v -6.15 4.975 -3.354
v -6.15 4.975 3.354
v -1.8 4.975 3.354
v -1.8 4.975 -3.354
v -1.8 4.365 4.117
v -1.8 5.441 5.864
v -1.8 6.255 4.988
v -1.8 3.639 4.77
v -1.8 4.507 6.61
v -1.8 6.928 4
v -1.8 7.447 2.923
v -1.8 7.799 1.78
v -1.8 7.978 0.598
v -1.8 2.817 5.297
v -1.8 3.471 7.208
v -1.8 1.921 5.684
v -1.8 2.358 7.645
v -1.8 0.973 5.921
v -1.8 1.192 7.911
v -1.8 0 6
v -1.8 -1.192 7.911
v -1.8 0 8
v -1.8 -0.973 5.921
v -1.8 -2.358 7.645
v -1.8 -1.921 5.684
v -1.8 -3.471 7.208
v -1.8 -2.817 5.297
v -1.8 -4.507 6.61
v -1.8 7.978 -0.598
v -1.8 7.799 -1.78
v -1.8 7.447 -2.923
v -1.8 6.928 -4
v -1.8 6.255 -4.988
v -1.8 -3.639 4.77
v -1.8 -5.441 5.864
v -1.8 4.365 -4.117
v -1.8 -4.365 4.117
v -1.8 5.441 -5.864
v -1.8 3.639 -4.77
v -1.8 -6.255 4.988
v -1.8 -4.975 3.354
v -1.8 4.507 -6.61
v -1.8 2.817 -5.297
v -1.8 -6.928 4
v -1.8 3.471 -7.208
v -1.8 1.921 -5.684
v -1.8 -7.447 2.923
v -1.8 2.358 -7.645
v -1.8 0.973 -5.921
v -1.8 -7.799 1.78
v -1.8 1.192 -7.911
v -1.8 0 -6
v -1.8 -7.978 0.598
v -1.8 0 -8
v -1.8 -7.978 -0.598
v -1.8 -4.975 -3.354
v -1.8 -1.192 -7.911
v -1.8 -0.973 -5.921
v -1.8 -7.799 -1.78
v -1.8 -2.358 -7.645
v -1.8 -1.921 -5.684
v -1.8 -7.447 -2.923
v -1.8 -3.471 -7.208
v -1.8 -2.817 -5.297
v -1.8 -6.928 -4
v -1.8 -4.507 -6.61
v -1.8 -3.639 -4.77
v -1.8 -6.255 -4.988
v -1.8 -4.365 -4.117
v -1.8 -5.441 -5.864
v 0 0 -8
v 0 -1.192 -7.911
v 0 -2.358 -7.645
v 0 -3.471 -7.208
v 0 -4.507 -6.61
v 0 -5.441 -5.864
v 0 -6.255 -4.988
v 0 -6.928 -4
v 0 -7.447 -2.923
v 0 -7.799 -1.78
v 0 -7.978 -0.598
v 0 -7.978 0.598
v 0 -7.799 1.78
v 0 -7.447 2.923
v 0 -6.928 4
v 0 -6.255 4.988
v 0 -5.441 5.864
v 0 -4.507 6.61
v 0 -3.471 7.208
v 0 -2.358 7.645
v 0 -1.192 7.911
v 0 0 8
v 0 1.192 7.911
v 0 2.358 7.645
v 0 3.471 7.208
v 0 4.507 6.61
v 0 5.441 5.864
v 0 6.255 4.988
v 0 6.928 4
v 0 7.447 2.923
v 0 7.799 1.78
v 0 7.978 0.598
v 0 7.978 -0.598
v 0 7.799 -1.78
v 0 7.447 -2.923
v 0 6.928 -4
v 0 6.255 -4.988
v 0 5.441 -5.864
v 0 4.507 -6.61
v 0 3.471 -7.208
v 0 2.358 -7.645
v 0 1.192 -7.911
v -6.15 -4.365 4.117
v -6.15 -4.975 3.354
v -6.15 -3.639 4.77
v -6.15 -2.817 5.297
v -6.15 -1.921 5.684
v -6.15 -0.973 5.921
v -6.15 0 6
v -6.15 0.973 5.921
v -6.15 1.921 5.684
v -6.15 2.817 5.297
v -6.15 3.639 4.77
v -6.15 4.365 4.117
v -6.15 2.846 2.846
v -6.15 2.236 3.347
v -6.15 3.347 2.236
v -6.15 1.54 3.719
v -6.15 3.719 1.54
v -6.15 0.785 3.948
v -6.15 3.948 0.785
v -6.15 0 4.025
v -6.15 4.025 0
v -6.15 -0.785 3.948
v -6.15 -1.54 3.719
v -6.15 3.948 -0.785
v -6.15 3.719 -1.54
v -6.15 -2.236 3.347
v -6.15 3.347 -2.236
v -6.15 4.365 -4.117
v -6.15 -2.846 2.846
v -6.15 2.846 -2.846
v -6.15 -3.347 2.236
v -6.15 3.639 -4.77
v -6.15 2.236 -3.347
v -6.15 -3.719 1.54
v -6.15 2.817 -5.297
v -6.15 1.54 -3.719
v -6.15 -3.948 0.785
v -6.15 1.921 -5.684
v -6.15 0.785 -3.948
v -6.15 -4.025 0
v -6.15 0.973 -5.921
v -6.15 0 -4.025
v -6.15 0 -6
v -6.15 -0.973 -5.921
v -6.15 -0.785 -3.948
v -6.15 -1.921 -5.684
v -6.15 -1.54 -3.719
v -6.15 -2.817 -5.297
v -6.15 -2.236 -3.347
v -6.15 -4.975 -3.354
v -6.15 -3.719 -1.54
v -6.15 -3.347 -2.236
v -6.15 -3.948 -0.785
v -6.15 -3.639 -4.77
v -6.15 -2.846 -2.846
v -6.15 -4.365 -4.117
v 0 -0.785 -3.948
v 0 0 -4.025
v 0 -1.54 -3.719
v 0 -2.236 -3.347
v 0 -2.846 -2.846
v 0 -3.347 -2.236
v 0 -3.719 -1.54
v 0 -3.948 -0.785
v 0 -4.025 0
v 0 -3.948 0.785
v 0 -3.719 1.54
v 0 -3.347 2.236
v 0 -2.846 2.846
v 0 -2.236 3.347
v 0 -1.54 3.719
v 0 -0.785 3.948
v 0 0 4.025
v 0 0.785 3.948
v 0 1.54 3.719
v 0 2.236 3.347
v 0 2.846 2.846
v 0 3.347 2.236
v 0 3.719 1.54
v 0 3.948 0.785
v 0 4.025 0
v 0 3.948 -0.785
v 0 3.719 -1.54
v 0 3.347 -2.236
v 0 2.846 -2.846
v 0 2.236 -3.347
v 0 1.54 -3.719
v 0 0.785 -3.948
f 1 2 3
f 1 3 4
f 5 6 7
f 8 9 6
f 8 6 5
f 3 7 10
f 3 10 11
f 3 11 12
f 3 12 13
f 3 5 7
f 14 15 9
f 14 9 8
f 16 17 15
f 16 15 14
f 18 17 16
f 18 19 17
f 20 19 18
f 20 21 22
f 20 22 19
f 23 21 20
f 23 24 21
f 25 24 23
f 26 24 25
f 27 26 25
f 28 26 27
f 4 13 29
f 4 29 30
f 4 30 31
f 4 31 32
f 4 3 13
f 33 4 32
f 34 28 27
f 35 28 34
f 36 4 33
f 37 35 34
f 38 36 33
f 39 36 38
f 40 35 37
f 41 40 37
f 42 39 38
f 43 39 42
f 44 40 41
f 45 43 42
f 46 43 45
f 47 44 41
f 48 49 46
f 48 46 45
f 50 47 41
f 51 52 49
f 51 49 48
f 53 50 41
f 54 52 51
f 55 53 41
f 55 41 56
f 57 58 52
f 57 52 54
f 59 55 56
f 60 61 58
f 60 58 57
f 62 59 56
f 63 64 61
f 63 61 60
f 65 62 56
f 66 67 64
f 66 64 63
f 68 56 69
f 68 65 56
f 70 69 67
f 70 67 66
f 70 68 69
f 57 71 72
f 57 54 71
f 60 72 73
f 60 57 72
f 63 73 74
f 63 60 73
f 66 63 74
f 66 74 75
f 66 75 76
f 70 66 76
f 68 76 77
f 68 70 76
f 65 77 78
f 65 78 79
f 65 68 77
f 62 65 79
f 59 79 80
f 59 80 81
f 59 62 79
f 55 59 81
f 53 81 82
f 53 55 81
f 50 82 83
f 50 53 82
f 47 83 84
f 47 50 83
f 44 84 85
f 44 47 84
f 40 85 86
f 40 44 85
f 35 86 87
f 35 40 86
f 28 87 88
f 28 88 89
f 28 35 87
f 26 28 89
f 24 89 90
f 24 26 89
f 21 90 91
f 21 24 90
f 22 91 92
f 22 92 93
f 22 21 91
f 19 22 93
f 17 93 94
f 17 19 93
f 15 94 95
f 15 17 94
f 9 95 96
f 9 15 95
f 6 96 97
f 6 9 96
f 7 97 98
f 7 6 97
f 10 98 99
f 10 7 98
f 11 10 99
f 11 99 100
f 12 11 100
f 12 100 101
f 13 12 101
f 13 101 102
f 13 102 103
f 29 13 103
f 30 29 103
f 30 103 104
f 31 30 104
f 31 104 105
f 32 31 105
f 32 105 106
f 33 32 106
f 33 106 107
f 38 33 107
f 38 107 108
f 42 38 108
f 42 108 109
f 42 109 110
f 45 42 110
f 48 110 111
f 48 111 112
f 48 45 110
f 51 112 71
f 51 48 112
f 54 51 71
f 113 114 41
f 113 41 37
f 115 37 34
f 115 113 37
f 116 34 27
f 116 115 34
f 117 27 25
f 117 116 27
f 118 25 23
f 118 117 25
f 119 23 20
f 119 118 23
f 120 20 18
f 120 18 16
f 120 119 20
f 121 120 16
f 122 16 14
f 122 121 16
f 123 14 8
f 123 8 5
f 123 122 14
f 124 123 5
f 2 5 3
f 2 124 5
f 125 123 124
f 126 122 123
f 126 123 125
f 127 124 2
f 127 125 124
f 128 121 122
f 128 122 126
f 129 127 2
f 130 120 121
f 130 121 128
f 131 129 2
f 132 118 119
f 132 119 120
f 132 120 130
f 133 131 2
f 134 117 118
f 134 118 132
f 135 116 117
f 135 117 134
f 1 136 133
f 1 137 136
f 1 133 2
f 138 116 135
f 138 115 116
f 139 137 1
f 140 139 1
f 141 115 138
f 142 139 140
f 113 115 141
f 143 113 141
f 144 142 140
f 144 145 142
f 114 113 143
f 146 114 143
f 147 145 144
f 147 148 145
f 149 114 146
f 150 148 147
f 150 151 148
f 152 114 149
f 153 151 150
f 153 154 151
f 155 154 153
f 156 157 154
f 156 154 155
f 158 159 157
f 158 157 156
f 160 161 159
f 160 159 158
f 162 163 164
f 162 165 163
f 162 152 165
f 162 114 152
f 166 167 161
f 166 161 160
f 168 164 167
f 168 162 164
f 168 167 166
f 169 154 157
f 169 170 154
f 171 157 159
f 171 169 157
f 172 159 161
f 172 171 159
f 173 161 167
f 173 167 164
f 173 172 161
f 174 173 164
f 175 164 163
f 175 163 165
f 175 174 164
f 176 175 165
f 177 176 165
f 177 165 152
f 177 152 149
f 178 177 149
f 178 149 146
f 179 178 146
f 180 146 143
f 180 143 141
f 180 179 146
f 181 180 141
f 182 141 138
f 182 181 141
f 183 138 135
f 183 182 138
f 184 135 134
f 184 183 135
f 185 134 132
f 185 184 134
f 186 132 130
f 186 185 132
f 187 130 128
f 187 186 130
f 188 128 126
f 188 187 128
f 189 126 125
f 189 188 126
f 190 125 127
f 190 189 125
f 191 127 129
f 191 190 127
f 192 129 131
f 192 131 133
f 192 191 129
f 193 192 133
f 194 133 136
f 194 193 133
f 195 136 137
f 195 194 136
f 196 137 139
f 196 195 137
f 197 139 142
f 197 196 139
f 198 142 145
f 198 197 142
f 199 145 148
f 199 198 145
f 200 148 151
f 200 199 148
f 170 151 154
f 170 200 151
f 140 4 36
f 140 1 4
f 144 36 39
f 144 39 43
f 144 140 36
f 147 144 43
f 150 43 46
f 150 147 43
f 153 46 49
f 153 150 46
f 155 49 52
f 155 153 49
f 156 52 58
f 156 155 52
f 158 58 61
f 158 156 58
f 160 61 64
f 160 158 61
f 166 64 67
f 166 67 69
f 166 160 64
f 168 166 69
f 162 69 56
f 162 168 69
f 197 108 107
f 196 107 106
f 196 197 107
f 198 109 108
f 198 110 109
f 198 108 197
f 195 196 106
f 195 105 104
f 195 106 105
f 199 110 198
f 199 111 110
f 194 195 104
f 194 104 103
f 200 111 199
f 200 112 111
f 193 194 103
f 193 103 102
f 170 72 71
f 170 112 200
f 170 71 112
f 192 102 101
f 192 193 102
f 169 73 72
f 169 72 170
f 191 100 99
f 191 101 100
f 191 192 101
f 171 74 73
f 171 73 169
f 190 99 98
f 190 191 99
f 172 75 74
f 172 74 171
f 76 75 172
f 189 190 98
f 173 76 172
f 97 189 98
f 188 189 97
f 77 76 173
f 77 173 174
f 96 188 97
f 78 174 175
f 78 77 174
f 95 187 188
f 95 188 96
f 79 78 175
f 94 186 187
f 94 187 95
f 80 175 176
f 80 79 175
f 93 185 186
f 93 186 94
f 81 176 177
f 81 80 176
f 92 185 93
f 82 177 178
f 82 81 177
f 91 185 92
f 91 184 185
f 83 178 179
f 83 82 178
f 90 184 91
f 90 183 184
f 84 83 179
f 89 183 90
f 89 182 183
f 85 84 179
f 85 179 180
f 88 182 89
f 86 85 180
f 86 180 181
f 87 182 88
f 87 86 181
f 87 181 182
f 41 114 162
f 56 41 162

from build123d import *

# Parameters (mm, degrees)
CORTAR_EXTRUIR1_DEPTH = 4.35


with BuildPart() as part:
    # Croquis1 → Revolución1 (revolve)
    with BuildSketch(Plane(origin=(0, 0, 0), x_dir=(0, 1, 0), z_dir=(0, 0, 1)), mode=Mode.PRIVATE) as revoluci_n1_sk:
        Polygon((4.025, 6.15), (4.025, 0), (8, 0), (8, 1.8), (6, 1.8), (6, 6.15), align=None)
    revolve(revoluci_n1_sk.sketch.rotate(Axis((0, 0, 0), (-1, 0, 0)), 90), axis=Axis((0, 0, 0), (-1, 0, 0)))

    # Croquis2 → Cortar-Extruir1 (cut)
    with BuildSketch(Plane(origin=(-6.15, 0, 0), x_dir=(0, -1, 0), z_dir=(-1, 0, 0))):
        with BuildLine():
            Line((-4.975, 3.354008795), (-4.975, -3.354008795))
            ThreePointArc((-4.975, -3.354008795), (-6, 0), (-4.975, 3.354008795))
        make_face()
        with BuildLine():
            Line((4.975, 3.354008795), (4.975, -3.354008795))
            ThreePointArc((4.975, -3.354008795), (6, 0), (4.975, 3.354008795))
        make_face()
    extrude(amount=-CORTAR_EXTRUIR1_DEPTH, mode=Mode.SUBTRACT)


solid = part.part
